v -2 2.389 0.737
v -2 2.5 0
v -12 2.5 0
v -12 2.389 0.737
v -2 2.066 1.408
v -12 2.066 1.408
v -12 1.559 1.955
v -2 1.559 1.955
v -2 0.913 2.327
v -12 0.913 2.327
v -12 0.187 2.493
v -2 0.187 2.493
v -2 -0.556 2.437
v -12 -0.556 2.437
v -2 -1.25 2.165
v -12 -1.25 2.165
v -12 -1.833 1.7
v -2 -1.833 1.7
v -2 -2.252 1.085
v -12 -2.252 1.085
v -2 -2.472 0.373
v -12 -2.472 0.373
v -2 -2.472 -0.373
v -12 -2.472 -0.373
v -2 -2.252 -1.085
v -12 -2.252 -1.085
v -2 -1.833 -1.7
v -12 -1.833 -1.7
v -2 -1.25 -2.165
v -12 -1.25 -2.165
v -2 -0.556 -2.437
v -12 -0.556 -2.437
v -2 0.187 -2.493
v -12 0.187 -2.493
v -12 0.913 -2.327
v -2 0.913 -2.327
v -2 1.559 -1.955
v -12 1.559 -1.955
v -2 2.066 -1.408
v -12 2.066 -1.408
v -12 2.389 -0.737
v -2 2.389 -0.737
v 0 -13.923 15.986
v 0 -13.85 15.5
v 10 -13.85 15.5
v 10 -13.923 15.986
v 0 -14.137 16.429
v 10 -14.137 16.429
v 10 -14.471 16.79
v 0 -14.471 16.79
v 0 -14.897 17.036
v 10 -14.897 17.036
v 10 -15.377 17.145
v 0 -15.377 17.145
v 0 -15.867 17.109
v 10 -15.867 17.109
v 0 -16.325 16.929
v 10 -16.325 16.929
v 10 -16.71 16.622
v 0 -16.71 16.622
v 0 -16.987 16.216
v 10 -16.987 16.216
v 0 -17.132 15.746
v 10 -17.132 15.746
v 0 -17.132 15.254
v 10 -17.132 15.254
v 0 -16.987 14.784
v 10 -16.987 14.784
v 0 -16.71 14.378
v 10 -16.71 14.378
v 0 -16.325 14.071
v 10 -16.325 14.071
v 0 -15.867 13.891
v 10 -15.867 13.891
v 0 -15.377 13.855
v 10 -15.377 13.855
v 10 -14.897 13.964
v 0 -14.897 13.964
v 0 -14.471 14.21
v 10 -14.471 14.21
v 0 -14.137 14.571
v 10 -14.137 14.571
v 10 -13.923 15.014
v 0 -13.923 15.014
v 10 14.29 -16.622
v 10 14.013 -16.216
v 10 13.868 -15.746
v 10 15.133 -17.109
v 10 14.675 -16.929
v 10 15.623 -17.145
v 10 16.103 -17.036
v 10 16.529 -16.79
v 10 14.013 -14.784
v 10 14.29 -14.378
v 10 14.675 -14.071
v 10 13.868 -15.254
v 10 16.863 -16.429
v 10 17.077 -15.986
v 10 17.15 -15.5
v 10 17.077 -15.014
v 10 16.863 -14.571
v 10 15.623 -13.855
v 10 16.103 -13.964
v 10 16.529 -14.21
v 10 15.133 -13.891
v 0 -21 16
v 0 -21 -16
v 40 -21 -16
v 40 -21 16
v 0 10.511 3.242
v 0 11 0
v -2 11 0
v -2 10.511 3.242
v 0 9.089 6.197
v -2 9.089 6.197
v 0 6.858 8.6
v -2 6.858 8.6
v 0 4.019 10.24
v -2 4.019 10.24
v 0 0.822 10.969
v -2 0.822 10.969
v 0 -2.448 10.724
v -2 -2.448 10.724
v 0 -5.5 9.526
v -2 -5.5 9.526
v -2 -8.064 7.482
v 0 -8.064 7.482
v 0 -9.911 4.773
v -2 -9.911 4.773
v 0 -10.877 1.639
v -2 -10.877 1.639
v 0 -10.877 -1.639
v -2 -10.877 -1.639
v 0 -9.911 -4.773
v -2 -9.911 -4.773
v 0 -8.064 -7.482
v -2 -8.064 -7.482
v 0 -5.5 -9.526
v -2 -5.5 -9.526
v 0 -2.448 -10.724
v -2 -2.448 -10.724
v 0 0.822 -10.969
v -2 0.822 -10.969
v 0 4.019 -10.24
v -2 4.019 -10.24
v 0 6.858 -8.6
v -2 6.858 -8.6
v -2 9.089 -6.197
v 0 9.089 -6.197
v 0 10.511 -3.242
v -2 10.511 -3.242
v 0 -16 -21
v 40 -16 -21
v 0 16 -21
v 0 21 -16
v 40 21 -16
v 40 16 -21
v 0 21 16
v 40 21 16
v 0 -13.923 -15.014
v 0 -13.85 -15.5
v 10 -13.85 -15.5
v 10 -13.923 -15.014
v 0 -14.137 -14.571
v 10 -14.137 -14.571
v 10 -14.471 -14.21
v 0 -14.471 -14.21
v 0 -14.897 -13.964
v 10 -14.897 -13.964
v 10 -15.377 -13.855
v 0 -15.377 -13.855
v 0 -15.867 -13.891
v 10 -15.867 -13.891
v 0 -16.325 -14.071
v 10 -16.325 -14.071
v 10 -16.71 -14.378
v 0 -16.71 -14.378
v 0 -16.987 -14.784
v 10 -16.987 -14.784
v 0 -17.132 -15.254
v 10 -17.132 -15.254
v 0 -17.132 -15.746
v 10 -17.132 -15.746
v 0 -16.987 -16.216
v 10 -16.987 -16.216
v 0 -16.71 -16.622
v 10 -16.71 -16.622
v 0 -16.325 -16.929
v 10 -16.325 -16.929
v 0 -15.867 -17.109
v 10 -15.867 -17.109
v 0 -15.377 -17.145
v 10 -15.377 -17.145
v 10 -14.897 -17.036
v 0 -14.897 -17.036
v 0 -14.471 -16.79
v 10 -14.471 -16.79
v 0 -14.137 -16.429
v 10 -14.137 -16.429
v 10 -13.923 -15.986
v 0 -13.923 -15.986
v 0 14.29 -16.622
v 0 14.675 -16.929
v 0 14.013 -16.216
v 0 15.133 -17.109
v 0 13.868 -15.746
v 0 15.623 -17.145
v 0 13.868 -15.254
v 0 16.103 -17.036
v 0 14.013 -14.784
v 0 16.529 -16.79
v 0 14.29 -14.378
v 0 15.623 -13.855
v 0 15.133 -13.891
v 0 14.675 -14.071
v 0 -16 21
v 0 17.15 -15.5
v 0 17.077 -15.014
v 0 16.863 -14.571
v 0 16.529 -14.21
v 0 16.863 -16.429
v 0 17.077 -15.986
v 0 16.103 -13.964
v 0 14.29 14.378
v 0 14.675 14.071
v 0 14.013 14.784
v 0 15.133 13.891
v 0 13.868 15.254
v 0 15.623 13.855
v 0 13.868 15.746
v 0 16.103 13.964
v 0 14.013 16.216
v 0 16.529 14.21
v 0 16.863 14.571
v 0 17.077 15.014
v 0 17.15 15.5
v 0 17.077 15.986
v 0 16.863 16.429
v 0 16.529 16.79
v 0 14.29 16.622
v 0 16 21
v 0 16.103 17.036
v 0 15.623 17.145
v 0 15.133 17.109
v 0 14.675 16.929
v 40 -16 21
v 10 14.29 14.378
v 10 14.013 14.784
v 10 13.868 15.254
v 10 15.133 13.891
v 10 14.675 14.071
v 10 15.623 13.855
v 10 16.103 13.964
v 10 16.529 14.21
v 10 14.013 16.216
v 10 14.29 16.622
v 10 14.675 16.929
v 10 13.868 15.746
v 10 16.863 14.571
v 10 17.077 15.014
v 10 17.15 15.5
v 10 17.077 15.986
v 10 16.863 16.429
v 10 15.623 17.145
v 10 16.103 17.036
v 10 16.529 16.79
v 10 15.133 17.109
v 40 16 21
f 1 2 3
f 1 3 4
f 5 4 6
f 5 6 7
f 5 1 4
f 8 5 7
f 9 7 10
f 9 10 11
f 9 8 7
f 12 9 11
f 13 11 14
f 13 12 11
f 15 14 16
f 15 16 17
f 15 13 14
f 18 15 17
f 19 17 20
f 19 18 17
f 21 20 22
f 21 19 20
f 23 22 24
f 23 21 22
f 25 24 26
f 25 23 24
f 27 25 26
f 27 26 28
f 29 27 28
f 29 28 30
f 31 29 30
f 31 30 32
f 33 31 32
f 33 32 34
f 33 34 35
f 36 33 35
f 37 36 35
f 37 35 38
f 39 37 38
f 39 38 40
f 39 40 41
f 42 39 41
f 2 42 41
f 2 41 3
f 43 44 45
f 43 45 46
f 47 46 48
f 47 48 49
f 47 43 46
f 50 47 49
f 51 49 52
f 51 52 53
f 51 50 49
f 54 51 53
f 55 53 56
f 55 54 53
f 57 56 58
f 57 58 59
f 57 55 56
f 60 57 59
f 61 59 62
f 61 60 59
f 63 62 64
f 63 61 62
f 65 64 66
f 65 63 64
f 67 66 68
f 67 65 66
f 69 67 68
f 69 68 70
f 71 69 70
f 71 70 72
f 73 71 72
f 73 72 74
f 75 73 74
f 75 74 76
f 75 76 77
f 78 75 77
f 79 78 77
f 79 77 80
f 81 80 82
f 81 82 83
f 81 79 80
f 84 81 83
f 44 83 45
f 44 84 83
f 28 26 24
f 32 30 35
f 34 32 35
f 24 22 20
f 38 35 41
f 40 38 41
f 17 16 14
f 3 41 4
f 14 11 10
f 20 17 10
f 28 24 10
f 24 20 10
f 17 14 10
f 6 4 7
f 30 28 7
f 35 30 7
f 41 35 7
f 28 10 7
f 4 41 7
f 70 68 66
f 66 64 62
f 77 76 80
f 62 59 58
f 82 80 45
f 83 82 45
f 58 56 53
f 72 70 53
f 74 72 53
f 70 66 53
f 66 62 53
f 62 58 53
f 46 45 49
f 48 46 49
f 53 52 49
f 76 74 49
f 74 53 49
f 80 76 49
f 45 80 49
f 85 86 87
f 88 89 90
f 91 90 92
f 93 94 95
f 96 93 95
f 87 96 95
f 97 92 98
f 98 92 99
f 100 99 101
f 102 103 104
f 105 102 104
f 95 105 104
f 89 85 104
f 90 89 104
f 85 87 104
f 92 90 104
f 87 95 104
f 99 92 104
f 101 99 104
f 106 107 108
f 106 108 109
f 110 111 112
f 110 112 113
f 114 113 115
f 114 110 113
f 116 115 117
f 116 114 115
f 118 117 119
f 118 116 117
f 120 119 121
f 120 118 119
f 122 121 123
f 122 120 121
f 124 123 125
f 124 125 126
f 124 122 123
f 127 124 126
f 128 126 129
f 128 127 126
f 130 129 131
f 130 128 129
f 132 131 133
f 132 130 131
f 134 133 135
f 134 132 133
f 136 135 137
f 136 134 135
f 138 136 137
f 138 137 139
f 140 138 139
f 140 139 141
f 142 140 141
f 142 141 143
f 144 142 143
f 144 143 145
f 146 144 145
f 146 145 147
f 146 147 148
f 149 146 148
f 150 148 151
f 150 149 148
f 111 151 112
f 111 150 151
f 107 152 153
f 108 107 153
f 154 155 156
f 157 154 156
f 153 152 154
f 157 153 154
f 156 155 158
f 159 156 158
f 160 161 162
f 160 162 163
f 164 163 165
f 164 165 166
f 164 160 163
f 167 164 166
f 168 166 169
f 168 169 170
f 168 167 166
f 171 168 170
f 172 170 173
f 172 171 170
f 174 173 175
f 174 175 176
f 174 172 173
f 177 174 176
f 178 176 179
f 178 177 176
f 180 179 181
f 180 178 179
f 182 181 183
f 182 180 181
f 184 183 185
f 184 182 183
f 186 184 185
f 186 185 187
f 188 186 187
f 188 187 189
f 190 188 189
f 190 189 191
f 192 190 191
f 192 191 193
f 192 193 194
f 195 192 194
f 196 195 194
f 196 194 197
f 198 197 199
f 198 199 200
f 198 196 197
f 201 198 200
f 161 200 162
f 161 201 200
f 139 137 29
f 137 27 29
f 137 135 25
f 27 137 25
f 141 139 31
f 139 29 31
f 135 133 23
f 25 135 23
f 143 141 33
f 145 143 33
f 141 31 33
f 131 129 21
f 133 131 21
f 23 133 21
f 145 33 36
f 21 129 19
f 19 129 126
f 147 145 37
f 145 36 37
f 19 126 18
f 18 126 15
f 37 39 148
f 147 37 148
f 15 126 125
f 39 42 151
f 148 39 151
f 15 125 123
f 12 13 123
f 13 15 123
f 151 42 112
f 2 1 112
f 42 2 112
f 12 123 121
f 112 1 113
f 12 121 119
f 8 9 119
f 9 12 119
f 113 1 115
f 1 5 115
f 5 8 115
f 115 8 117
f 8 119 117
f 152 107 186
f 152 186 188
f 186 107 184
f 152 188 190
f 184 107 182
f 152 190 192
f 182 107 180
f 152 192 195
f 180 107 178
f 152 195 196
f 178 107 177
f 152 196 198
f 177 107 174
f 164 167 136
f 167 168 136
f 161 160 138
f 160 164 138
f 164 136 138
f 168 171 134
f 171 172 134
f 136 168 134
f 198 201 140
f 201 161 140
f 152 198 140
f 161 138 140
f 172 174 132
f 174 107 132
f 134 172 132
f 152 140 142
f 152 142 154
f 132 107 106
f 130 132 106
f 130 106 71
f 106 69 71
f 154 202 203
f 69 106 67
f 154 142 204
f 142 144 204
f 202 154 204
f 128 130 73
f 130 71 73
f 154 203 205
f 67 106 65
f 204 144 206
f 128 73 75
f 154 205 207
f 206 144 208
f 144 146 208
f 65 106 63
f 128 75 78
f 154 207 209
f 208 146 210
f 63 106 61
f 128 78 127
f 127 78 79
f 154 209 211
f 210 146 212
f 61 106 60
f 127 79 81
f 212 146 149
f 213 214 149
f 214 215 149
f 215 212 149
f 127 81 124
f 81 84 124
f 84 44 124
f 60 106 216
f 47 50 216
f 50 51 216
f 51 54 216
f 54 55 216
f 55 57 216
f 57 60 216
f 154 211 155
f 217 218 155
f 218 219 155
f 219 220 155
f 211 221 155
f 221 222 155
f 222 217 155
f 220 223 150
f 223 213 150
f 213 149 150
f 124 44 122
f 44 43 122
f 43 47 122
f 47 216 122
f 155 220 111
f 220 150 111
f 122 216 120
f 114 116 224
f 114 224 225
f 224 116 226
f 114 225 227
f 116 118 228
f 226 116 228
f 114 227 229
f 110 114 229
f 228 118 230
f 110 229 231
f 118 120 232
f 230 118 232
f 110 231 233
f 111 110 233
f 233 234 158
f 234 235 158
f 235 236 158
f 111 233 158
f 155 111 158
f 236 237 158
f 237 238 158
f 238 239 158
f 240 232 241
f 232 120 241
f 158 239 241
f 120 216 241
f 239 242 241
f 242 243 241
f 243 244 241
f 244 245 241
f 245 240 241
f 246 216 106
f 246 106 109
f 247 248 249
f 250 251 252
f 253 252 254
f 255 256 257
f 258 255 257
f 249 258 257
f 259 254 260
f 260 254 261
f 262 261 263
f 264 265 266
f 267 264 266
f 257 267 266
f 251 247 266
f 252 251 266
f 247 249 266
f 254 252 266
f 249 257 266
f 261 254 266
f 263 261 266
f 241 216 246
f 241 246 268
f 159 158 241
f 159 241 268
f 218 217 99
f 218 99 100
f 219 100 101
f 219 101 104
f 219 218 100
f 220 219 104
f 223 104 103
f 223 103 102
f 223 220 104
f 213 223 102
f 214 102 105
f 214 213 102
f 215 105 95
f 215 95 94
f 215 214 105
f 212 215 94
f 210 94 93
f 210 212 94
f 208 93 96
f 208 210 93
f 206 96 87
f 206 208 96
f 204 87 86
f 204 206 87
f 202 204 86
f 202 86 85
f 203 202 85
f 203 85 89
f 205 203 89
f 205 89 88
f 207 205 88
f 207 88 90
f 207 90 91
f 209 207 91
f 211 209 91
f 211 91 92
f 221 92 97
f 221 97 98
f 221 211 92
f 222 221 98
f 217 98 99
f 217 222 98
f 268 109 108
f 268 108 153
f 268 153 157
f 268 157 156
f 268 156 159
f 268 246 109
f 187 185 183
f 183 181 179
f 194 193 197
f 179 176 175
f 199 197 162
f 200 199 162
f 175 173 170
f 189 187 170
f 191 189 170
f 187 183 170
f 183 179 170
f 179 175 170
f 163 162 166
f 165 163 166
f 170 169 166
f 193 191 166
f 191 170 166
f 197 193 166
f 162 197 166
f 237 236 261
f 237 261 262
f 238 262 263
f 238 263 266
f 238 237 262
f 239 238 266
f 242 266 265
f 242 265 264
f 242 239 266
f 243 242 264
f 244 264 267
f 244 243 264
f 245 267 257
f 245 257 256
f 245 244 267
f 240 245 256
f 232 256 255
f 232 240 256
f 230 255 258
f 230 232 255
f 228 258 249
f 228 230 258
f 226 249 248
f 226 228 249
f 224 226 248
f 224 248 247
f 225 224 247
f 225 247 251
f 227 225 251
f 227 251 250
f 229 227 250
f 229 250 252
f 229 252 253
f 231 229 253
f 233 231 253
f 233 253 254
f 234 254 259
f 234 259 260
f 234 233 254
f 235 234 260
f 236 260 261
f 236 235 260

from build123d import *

# Parameters (mm, degrees)
F0_W     = 42
F0_H     = 42
F0_R     = 1.65
F0_R_2   = 11
F0_R_3   = 2.5
F1_DEPTH = 40
F2_DEPTH = 2
F3_DEPTH = 12
F4_DEPTH = 10
F5_SIZE  = 5


with BuildPart() as f1:
    # F0 (on Right) → F1 (new body)
    with BuildSketch(Plane.YZ):
        Rectangle(F0_W, F0_H)
        with Locations((-15.5, -15.5)):
            Circle(F0_R, mode=Mode.SUBTRACT)
        with Locations((15.5, -15.5)):
            Circle(F0_R, mode=Mode.SUBTRACT)
        with Locations((-15.5, 15.5)):
            Circle(F0_R, mode=Mode.SUBTRACT)
        Circle(F0_R_2, mode=Mode.SUBTRACT)
        with Locations((15.5, 15.5)):
            Circle(F0_R, mode=Mode.SUBTRACT)
        with Locations((15.5, -15.5)):
            Circle(F0_R)
        with Locations((-15.5, -15.5)):
            Circle(F0_R)
        with Locations((-15.5, 15.5)):
            Circle(F0_R)
        with Locations((15.5, 15.5)):
            Circle(F0_R)
        Circle(F0_R_2)
        Circle(F0_R_3, mode=Mode.SUBTRACT)
        Circle(F0_R_3)
    extrude(amount=F1_DEPTH)

    # F0 (on Right) → F2 (join)
    with BuildSketch(Plane.YZ):
        Circle(F0_R_2)
        Circle(F0_R_3, mode=Mode.SUBTRACT)
        Circle(F0_R_3)
    extrude(amount=-F2_DEPTH)

    # F0 (on Right) → F3 (join)
    with BuildSketch(Plane.YZ):
        Circle(F0_R_3)
    extrude(amount=-F3_DEPTH)

    # F0 (on Right) → F4 (cut)
    with BuildSketch(Plane.YZ):
        with Locations((15.5, 15.5)):
            Circle(F0_R)
        with Locations((15.5, -15.5)):
            Circle(F0_R)
        with Locations((-15.5, 15.5)):
            Circle(F0_R)
        with Locations((-15.5, -15.5)):
            Circle(F0_R)
    extrude(amount=F4_DEPTH, mode=Mode.SUBTRACT)

    # F5
    f5_edges = [f1.edges().sort_by_distance(p)[0] for p in [
        (20, -21, 21),
        (20, 21, 21),
        (20, 21, -21),
        (20, -21, -21),
    ]]
    chamfer(f5_edges, length=F5_SIZE)


solid = f1.part
